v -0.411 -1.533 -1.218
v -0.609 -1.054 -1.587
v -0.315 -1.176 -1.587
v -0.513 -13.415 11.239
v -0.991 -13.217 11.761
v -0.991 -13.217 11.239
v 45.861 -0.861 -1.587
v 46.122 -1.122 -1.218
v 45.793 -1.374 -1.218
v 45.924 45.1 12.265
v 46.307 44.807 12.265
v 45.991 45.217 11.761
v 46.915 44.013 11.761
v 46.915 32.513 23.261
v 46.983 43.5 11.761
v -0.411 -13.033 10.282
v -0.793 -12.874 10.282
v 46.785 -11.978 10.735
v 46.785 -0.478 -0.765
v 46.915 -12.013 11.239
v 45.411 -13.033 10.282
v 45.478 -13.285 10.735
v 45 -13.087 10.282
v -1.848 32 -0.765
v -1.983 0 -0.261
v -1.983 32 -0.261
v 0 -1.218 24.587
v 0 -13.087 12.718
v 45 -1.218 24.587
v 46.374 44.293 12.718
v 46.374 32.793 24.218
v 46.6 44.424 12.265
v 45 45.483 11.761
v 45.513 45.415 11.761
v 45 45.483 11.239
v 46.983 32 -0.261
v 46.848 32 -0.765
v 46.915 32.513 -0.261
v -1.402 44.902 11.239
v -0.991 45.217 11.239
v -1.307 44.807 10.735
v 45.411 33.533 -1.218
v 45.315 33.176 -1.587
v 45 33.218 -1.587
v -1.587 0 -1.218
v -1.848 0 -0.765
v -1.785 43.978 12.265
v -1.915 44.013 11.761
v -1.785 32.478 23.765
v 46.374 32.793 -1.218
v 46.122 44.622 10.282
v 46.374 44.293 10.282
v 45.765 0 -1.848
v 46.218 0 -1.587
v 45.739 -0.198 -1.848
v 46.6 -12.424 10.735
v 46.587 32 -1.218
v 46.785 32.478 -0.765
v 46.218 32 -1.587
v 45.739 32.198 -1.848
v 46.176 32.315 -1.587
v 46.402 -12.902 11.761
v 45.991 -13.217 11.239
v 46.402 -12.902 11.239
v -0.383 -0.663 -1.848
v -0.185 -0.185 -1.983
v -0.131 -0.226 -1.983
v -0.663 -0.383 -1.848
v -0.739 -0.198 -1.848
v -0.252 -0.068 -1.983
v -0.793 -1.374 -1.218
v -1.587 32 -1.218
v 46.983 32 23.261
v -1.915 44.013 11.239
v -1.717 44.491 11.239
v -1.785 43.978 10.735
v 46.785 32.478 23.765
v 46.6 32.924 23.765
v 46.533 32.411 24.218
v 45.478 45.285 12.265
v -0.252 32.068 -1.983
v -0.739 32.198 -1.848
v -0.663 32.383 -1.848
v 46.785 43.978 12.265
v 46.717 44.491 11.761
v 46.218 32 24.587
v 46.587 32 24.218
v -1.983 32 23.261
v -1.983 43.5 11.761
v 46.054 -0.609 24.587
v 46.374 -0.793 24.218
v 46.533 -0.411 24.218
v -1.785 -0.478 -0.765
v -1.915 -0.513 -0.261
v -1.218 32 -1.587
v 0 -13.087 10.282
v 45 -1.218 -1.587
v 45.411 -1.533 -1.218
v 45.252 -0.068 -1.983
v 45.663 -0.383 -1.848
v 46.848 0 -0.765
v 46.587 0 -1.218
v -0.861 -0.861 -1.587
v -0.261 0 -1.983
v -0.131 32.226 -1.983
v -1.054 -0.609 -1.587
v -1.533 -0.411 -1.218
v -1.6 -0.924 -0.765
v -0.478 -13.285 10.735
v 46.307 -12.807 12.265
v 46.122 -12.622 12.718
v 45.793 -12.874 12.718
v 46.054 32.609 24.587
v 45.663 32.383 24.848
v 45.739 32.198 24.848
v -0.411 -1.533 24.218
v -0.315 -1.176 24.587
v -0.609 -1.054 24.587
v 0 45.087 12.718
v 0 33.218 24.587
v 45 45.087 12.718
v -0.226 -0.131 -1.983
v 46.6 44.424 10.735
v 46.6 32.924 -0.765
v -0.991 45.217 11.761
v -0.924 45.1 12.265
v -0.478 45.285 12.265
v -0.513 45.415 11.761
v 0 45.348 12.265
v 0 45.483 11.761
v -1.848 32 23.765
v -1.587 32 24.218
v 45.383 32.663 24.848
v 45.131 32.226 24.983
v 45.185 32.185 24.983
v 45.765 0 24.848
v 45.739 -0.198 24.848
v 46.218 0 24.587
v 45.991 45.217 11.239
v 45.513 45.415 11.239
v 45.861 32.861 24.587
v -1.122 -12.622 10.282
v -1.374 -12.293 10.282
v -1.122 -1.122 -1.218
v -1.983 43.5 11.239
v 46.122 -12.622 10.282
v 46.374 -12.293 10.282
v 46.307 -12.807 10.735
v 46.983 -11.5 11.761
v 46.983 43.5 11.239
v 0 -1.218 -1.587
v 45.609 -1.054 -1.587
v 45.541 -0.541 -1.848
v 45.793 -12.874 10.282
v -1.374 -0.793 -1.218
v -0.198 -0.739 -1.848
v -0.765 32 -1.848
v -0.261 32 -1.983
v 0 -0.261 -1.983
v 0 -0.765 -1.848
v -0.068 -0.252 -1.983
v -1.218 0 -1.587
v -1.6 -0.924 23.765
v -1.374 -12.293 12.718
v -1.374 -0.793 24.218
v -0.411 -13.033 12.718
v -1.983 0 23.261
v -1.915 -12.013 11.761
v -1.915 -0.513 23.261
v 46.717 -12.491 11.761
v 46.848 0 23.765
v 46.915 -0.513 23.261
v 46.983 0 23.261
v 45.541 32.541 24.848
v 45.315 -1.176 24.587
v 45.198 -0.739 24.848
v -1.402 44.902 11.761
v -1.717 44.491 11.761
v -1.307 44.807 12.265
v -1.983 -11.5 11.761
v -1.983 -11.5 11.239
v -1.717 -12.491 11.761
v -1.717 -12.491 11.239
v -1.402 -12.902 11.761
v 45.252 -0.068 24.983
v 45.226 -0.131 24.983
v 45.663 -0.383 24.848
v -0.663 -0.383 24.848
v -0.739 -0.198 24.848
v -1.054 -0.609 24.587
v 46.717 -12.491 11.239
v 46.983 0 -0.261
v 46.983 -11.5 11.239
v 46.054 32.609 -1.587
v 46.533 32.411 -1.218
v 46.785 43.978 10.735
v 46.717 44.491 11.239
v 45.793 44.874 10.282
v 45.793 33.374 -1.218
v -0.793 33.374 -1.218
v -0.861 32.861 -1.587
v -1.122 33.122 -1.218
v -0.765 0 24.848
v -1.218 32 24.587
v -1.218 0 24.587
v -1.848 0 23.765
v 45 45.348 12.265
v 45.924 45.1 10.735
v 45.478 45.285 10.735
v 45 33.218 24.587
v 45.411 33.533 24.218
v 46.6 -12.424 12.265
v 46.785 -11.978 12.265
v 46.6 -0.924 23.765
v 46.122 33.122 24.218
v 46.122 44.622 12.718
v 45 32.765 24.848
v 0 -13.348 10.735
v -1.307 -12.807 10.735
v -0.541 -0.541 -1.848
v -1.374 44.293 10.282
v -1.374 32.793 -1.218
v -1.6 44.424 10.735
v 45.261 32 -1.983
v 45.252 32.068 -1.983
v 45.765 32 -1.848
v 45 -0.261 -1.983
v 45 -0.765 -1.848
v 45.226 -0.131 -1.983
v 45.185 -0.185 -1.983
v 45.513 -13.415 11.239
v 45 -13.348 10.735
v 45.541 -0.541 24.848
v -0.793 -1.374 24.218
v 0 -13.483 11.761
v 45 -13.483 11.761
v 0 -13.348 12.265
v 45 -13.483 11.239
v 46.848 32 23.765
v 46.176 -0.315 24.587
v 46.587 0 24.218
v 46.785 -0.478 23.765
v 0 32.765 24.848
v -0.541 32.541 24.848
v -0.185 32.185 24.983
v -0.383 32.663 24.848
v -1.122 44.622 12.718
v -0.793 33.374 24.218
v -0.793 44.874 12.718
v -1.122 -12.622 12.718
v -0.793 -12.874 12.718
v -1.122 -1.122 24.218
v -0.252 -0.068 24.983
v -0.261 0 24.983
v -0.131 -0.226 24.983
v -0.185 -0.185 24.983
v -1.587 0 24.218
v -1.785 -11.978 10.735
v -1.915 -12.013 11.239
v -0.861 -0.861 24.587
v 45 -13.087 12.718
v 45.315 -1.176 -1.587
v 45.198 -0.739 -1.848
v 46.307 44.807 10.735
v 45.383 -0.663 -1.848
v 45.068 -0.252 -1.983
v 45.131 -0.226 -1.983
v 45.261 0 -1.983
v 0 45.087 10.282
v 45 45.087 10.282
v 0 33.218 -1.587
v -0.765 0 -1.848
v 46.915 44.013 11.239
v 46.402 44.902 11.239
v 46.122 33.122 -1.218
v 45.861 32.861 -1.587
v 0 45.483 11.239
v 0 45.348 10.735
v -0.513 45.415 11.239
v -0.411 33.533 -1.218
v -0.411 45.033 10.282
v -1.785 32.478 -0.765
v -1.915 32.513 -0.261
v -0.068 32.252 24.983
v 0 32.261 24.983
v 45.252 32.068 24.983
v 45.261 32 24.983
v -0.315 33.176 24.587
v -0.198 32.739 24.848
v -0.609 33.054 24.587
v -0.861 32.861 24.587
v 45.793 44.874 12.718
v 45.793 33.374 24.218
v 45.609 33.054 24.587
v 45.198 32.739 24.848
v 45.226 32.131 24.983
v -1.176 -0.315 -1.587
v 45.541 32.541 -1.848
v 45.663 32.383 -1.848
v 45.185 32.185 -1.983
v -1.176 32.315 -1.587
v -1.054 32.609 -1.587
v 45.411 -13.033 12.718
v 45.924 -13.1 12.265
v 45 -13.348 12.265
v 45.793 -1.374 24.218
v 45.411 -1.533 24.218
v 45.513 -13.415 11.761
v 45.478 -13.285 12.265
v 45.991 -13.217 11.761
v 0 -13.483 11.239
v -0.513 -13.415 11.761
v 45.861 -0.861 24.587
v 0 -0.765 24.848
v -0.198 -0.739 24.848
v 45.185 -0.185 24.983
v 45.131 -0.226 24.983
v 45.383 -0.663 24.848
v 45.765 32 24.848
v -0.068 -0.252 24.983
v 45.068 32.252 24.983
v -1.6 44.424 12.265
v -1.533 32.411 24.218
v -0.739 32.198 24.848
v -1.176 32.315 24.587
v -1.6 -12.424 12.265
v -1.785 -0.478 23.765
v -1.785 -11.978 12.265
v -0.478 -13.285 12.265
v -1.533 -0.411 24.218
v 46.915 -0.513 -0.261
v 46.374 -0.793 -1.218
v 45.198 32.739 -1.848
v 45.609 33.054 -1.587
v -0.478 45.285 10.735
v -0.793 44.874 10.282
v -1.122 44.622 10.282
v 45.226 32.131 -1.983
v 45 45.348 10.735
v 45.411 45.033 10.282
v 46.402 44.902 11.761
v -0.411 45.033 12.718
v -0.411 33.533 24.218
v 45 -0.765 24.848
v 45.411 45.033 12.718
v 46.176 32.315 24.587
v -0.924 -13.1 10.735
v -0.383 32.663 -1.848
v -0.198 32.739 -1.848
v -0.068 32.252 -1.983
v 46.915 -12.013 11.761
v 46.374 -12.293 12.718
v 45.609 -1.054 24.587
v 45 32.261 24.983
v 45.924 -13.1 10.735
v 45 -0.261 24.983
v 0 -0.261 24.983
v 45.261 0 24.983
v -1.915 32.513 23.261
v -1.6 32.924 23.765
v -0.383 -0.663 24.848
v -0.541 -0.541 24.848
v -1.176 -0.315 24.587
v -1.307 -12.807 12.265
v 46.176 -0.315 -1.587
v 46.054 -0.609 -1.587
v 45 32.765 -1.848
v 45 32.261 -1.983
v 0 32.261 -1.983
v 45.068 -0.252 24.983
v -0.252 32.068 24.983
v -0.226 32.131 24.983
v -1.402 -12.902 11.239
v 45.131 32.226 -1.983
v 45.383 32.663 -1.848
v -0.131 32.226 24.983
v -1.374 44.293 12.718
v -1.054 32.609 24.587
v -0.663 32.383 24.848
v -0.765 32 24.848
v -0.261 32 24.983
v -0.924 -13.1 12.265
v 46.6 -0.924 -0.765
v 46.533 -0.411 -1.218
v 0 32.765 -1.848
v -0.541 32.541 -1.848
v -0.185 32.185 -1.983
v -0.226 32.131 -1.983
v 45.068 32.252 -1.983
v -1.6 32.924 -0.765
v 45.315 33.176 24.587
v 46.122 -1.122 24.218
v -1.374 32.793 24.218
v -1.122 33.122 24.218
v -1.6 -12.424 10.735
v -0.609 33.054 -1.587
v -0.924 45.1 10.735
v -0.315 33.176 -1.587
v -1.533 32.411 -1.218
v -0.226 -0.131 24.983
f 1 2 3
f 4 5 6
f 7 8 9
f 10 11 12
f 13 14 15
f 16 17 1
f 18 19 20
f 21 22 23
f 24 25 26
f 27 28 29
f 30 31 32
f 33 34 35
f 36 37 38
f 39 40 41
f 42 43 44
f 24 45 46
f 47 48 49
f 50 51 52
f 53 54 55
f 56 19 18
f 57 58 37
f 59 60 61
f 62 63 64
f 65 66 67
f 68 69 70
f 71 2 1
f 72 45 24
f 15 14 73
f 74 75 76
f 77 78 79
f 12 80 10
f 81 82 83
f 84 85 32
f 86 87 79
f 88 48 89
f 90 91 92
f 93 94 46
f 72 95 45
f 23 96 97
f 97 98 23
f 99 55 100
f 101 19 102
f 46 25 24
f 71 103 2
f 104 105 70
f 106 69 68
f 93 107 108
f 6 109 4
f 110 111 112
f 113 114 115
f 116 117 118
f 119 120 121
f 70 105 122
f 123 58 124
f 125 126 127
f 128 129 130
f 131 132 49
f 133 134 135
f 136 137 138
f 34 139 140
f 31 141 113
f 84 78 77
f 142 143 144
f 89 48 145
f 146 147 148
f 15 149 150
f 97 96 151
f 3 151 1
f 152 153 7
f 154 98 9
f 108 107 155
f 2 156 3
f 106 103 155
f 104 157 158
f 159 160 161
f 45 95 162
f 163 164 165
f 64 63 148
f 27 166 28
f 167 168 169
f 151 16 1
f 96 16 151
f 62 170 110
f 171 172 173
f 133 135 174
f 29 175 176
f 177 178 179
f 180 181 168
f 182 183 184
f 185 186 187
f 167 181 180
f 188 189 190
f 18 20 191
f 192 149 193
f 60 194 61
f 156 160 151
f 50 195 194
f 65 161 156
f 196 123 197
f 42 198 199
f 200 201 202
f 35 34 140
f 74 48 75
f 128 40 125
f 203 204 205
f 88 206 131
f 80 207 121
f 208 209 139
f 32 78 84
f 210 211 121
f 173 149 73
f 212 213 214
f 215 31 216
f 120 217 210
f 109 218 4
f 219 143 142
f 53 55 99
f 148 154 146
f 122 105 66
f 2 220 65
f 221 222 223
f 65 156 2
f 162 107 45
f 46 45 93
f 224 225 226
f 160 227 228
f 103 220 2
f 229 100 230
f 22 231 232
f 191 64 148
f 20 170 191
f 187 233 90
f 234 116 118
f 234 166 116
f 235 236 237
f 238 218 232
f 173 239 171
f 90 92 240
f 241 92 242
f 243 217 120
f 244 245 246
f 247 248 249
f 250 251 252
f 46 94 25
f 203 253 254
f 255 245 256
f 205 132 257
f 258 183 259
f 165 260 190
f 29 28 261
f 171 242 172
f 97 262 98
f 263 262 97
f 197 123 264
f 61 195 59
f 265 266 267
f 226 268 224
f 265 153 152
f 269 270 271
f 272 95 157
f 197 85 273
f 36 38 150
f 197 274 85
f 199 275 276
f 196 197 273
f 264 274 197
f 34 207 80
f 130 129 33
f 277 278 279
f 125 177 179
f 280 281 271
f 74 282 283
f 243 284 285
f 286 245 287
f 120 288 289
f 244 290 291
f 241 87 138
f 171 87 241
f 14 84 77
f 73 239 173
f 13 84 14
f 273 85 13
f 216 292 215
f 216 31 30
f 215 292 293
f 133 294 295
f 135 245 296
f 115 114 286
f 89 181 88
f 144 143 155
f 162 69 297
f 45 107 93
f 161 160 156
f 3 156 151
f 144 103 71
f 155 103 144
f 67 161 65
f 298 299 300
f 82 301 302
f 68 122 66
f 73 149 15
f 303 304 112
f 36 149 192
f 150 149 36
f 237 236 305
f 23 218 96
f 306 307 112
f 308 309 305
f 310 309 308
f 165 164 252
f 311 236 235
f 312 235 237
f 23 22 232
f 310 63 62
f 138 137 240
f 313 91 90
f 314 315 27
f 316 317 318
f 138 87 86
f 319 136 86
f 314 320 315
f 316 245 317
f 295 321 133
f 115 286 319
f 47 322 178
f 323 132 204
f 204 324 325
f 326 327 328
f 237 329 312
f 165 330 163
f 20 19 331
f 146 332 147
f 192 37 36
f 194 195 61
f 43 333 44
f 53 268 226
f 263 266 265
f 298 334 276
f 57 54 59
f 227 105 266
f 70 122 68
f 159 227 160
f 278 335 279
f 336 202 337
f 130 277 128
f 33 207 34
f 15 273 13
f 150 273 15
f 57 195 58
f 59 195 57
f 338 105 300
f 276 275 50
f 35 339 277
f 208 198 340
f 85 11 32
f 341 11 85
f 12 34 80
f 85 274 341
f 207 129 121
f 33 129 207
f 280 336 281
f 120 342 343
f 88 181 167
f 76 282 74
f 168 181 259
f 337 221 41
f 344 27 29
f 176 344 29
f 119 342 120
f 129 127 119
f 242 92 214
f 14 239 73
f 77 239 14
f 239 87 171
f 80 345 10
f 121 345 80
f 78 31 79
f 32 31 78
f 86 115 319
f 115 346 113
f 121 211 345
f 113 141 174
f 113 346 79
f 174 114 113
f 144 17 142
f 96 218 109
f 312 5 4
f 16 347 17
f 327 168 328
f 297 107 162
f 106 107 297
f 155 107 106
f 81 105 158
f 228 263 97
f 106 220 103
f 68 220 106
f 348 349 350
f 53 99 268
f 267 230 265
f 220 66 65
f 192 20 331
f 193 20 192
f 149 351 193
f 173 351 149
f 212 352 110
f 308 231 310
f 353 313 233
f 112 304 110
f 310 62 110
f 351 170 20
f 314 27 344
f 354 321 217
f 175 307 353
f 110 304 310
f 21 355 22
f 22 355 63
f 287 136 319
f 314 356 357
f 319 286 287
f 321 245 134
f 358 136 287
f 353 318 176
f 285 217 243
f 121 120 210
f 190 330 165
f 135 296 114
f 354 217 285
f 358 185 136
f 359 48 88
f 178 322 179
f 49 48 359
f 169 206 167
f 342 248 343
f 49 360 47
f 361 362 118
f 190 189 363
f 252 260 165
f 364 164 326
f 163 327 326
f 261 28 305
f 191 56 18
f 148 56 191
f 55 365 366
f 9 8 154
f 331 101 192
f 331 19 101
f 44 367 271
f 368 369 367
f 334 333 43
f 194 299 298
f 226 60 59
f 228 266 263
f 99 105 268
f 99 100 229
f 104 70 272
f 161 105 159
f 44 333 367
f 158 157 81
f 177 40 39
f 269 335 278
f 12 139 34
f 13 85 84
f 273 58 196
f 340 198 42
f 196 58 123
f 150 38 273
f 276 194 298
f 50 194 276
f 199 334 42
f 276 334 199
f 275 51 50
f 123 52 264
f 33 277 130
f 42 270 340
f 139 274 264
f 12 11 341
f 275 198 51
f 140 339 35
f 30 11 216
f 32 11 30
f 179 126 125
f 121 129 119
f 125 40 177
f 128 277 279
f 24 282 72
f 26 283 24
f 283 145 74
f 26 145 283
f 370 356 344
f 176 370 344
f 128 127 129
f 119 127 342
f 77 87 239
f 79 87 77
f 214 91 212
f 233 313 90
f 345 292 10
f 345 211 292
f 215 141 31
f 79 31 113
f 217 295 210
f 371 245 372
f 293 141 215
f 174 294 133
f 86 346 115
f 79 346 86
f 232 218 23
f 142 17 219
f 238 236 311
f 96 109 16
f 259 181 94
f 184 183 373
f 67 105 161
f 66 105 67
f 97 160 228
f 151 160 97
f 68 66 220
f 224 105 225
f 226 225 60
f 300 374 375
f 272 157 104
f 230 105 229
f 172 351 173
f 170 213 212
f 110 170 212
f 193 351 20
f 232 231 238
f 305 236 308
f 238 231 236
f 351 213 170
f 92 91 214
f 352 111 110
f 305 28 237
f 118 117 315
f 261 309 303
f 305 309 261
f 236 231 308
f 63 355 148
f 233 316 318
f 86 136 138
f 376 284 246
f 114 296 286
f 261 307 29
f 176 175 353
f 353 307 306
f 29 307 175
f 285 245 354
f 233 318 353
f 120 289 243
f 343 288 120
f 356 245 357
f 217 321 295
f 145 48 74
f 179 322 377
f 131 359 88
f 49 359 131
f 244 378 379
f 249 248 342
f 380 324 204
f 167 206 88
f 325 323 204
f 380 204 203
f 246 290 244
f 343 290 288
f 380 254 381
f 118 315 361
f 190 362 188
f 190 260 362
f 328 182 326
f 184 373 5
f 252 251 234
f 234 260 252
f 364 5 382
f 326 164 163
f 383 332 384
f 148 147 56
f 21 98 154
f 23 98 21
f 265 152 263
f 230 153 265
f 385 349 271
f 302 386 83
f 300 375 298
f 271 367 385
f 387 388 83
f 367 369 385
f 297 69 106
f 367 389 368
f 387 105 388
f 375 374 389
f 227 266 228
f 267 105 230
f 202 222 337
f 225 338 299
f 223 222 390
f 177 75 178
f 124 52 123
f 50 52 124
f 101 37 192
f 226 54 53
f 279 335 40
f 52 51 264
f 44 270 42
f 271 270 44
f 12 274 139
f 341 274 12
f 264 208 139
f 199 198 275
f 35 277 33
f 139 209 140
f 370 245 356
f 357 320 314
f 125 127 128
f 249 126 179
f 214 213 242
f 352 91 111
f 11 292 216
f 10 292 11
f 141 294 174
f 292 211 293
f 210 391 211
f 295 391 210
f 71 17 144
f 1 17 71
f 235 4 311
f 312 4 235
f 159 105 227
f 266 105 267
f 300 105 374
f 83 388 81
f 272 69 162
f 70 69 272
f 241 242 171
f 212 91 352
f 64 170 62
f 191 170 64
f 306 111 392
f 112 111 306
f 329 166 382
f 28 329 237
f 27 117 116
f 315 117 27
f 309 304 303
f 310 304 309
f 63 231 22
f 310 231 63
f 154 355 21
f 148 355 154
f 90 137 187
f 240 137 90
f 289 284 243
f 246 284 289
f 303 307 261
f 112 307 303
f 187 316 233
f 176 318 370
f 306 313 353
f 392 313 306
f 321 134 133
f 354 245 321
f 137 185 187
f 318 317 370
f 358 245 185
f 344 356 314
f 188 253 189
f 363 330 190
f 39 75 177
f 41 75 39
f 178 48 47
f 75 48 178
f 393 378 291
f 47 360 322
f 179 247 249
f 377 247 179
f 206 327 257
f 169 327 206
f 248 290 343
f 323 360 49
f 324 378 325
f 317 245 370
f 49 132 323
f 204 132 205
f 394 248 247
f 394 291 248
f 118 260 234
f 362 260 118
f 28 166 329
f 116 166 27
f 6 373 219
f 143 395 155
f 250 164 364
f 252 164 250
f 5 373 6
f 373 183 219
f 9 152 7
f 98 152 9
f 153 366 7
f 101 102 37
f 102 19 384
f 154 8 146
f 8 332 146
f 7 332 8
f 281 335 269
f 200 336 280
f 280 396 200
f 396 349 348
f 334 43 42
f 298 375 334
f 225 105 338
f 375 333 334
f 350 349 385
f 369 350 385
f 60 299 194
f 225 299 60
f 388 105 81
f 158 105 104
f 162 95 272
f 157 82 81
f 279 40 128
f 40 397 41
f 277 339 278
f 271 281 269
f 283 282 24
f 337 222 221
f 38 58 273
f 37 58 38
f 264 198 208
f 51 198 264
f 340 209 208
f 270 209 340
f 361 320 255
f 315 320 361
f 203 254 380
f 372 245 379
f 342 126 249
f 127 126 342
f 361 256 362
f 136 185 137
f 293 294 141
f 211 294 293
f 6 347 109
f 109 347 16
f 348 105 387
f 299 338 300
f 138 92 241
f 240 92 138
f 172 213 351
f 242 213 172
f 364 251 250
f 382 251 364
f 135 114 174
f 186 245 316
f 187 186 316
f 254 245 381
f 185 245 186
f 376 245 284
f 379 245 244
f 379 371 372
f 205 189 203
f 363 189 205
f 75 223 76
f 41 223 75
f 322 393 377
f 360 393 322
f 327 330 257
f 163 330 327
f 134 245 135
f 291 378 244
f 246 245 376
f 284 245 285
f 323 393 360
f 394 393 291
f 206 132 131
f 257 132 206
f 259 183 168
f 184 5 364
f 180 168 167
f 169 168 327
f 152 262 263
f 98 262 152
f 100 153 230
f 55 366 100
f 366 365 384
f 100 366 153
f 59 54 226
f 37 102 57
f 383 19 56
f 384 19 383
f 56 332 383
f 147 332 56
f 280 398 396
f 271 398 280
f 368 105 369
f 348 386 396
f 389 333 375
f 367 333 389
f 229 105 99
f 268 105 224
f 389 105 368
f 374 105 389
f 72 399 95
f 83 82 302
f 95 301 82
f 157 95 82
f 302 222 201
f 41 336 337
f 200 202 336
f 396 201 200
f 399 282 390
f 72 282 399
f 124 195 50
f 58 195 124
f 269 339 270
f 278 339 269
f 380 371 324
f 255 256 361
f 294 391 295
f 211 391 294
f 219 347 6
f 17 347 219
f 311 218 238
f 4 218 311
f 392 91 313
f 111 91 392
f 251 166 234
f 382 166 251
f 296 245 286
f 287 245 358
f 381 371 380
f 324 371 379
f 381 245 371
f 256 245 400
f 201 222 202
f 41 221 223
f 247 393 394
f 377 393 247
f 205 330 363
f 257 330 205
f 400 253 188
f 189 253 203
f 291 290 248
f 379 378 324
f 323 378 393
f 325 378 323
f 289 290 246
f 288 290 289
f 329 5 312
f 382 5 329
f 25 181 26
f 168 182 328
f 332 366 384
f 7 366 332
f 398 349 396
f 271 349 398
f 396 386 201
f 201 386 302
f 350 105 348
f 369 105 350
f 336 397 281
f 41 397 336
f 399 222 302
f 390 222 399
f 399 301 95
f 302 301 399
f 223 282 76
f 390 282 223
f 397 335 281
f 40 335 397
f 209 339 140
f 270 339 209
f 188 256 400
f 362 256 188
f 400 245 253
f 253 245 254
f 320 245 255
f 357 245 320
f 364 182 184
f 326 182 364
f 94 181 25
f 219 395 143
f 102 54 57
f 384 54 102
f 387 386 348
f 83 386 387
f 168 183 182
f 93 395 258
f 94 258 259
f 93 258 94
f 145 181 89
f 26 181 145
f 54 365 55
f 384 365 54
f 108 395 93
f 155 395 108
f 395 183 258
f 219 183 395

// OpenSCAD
$fn = 24; 

//length, width, height
rounded_box([45, 32, 23], 2);

module rounded_box(size, radius) {
    minkowski()     {
        basic_shape(size);
        sphere(r=radius);
    }
}


module basic_shape(size) {
    //cube(size);
    translate([0, -size[2]/2, size[2]/2]) rotate([0, 90, 0]) linear_extrude(height=size[0]) hull() {
        rotate([0, 0, 45])
            square(size[2]/sqrt(2));
        translate([0, size[1], 0]) 
            rotate([0, 0, 45])
                square(size[2]/sqrt(2));
    }
}
